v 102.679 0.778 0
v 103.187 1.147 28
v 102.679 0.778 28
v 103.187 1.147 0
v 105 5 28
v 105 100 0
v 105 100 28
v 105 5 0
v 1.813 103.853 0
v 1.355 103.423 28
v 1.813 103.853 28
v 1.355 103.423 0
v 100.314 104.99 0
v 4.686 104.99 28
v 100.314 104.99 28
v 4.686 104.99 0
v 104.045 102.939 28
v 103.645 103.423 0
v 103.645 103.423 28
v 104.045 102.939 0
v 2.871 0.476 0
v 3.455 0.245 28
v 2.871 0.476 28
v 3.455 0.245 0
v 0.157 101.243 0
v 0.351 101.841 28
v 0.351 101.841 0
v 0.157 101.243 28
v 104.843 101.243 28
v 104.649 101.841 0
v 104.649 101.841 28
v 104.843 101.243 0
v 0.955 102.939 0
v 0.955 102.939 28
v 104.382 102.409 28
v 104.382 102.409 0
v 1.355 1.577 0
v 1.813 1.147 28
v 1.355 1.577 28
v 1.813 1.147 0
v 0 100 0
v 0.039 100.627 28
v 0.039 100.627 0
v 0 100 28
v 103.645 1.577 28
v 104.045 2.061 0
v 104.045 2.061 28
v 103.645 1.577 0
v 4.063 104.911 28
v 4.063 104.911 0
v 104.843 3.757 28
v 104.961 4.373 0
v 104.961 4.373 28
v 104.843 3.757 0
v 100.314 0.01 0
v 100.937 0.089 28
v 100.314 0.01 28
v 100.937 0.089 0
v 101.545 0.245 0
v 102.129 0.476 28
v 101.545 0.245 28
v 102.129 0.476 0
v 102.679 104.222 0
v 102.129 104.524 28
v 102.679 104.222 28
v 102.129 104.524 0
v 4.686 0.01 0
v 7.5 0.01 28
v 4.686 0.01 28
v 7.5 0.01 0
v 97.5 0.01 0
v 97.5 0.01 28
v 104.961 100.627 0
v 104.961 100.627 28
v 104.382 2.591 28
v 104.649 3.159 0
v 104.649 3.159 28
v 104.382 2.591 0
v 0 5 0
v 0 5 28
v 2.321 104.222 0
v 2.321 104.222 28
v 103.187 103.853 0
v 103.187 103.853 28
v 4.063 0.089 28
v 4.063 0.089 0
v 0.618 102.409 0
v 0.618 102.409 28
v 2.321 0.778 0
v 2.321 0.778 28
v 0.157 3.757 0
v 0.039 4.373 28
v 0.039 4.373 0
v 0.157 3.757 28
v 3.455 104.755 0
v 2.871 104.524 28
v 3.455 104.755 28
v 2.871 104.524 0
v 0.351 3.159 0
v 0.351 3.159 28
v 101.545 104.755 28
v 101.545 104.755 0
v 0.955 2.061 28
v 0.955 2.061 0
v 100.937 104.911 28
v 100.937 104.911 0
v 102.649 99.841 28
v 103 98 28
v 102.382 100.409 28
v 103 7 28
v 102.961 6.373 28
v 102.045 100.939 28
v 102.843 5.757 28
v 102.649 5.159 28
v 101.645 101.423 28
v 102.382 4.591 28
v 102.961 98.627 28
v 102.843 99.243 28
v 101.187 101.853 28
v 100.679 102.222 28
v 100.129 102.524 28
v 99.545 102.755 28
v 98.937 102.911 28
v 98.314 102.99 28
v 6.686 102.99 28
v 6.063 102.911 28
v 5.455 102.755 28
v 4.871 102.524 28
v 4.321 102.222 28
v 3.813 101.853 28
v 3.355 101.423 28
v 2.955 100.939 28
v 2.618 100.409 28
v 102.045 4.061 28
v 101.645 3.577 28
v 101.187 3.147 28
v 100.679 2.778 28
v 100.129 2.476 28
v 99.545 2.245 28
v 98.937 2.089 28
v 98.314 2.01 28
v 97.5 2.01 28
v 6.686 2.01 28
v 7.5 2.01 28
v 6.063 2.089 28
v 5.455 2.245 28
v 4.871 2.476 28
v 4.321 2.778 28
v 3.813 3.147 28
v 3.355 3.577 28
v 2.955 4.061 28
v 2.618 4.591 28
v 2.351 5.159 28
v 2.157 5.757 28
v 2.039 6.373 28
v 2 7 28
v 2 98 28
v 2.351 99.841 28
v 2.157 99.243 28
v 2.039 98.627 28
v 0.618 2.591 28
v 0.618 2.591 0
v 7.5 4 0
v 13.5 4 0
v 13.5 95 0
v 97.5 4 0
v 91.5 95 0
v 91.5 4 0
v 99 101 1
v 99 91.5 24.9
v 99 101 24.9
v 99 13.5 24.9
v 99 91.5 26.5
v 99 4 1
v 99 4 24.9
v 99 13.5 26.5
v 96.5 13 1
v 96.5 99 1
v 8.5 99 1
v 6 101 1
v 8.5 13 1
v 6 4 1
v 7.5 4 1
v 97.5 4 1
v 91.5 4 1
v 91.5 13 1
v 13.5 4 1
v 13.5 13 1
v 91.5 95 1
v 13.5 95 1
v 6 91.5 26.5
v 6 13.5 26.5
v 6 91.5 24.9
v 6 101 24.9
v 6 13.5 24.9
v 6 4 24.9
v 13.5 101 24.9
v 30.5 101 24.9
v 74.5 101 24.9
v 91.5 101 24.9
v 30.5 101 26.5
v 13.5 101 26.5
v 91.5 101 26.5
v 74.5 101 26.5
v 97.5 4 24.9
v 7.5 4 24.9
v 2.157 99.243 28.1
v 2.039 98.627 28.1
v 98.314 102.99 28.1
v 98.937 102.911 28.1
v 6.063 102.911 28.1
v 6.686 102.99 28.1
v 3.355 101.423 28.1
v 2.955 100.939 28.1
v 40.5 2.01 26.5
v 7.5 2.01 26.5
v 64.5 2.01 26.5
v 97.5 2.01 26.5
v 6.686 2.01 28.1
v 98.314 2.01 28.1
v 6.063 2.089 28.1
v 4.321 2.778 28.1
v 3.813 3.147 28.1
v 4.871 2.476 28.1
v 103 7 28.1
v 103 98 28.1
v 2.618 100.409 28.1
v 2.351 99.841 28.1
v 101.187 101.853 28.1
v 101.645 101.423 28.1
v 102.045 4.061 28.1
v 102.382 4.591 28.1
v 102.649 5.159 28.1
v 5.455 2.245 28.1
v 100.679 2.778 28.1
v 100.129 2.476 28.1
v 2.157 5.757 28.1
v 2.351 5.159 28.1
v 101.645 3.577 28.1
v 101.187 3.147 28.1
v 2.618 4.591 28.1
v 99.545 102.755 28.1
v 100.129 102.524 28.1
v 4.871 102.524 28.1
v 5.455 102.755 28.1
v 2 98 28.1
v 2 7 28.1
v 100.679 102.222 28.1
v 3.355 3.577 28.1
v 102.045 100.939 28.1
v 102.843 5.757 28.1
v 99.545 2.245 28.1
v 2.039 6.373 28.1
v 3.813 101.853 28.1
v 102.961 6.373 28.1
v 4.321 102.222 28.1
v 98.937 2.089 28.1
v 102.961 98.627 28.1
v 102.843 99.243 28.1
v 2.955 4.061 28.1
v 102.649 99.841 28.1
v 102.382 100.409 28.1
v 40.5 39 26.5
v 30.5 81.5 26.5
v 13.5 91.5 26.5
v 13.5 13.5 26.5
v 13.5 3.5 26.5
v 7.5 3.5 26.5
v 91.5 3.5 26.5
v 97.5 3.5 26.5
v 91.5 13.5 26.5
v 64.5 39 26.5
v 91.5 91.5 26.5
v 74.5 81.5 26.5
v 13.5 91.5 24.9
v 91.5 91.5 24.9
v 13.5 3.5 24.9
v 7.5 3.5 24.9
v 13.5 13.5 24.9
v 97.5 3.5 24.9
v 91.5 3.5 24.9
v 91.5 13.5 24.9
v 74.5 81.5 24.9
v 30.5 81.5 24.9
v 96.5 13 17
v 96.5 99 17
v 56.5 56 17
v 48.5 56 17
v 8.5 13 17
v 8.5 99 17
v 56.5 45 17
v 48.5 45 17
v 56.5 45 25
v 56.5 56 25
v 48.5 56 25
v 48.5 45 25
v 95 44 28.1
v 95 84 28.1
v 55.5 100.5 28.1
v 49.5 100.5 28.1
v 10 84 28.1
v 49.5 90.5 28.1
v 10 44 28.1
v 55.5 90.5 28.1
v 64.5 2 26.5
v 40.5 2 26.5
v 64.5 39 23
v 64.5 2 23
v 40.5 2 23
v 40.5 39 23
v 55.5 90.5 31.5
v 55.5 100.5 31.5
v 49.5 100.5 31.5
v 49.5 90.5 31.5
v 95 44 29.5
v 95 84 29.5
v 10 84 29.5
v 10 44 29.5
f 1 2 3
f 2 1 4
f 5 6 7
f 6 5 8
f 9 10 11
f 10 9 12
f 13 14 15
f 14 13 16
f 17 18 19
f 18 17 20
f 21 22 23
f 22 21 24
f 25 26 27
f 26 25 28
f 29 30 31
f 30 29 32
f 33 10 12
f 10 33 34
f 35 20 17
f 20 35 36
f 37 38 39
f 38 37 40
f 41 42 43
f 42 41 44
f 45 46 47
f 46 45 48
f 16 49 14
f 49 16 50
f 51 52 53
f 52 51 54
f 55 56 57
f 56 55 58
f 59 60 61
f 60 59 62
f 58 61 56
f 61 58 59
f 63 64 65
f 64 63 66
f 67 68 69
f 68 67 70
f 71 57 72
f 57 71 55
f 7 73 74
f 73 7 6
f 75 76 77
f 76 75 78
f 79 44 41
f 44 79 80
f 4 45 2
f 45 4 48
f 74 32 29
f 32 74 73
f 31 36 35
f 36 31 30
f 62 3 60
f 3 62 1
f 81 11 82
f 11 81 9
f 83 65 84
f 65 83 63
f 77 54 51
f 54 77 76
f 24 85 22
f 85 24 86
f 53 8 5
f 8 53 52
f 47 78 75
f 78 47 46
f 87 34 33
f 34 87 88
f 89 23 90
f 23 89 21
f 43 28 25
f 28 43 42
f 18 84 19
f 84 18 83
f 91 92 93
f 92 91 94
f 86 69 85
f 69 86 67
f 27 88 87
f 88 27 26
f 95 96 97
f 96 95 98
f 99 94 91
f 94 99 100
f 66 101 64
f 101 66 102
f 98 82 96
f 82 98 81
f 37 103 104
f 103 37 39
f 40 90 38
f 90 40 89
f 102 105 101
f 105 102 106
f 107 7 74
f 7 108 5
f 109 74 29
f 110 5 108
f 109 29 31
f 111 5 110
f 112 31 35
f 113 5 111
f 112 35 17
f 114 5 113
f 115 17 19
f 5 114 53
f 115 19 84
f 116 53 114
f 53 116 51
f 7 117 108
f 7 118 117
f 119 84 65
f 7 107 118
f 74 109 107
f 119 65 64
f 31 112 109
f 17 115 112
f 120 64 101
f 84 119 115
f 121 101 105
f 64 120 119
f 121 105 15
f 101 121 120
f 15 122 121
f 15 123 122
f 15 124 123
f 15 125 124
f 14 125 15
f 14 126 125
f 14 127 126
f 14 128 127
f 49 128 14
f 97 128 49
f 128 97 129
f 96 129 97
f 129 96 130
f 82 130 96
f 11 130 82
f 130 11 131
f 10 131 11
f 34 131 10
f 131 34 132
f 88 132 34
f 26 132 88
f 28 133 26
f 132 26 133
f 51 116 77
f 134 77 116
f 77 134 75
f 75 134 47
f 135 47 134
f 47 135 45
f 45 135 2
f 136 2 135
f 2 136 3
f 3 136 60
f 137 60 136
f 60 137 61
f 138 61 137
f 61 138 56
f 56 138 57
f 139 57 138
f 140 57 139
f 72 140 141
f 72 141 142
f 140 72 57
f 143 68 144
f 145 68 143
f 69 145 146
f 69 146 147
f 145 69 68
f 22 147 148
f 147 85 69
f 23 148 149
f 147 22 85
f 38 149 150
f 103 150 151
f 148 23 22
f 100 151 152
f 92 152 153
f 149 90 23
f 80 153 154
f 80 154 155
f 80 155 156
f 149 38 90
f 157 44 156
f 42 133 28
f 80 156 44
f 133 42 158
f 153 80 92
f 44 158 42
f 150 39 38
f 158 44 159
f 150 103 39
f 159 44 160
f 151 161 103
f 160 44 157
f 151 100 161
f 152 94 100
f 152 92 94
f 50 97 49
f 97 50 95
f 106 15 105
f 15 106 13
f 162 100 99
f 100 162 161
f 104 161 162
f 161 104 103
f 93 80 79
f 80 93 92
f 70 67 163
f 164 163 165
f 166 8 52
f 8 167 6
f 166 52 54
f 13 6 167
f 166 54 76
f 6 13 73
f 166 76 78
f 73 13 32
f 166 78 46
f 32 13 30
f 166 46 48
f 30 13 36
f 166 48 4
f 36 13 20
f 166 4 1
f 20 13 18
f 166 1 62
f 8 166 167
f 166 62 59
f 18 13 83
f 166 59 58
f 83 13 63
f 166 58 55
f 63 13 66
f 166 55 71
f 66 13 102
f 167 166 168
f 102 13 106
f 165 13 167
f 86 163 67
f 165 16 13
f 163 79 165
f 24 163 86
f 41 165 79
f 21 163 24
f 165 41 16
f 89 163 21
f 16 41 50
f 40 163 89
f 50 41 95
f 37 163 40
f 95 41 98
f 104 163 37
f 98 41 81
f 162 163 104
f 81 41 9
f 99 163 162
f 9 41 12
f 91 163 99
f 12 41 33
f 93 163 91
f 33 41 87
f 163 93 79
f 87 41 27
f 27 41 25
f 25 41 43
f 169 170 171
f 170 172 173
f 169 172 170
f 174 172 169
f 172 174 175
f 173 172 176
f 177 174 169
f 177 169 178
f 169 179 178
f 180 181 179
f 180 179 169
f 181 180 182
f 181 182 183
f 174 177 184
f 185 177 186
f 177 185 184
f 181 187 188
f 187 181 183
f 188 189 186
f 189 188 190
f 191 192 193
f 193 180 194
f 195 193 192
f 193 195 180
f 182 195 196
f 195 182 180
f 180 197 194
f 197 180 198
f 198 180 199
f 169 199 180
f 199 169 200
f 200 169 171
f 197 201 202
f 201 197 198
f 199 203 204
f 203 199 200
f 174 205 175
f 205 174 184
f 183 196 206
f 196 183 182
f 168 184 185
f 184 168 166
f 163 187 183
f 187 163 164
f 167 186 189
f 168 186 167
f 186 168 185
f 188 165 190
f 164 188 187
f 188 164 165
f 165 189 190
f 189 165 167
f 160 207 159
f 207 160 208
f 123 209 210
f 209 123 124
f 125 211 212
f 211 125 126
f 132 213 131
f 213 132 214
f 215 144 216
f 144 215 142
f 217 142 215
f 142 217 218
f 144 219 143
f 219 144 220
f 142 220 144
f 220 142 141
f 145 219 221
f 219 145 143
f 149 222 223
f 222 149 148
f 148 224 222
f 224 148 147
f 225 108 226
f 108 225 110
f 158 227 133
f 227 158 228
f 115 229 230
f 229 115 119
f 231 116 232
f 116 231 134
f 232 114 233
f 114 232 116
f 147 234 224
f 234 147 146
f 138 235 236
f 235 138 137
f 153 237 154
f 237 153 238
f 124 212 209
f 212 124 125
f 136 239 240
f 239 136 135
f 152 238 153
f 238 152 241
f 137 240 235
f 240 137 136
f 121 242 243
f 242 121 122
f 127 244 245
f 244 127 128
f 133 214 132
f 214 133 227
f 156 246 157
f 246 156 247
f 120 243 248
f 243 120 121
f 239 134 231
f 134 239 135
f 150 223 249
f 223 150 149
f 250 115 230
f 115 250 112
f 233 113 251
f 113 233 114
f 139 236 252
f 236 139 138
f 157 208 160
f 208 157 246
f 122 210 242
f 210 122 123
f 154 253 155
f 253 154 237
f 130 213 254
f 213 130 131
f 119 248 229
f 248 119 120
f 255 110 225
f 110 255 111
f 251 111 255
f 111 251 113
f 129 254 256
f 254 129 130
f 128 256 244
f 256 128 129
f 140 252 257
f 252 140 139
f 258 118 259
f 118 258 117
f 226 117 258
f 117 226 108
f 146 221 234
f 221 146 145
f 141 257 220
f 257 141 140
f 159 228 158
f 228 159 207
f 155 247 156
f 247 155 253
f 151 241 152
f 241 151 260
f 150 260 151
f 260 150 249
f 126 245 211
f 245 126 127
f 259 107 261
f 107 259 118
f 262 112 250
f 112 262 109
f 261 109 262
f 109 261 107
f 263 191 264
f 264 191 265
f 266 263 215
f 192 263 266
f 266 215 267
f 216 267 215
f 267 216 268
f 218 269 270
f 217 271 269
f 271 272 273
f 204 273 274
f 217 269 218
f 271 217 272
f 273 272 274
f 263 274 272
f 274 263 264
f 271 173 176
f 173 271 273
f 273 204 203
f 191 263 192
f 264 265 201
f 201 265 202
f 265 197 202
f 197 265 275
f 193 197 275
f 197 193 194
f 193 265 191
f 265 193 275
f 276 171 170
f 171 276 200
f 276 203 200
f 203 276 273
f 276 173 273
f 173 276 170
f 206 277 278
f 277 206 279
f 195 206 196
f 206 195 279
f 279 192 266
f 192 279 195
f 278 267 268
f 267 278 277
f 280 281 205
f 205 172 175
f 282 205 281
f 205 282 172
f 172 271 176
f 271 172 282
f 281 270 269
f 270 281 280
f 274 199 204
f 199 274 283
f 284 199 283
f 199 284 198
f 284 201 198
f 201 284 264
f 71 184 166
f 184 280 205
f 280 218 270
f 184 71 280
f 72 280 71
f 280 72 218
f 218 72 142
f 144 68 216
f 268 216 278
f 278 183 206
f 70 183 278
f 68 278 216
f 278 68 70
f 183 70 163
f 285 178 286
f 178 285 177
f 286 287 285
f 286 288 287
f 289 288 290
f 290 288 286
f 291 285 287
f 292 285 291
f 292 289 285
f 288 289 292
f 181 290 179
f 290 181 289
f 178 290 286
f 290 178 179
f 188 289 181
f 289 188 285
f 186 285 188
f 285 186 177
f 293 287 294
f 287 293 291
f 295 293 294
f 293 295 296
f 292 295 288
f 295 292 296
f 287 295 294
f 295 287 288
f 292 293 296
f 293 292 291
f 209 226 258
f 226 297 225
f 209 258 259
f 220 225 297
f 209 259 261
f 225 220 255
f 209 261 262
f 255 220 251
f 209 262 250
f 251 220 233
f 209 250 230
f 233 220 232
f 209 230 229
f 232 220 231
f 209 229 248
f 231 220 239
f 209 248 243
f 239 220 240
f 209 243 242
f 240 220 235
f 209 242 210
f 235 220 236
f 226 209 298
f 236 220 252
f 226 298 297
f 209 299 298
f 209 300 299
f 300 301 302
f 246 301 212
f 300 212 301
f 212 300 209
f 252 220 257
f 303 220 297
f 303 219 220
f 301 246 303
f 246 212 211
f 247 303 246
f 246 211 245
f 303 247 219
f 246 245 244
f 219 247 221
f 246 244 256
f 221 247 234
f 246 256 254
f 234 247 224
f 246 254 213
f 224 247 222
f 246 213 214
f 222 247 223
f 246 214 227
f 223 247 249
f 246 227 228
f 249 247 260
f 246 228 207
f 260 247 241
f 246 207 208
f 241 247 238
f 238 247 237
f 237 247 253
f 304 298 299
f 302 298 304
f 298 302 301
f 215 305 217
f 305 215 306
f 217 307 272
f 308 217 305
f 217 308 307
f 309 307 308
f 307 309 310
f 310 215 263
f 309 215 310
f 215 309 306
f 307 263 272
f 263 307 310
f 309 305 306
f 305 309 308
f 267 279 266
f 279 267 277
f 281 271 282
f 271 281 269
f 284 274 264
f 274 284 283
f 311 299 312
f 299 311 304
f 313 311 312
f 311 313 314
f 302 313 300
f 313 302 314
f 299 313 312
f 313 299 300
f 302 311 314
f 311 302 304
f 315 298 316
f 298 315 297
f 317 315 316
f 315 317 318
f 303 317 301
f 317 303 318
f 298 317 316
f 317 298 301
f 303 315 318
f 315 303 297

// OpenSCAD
// Define the switch type to be covered.
// New style Single switch = 0
// New style Double switch = 1 - not implemented.
// Old style Single switch = 2
// Old style Double switch = 3
switchType  = 2; // Update depth also.

// if new style switch
//depth = 19;
// if old style
depth = 28;

// The gap to leave between the cover and the base when pushed together.
// Adjust this to give a tighter (smaller number) or looser (larger number) fit between
// the base and the cover. This will depend on your printer.
coverToBasegap = 0.4;
            
// Size of the outer bezel that surounds the PCB
bezelSize = 2;

// Thickness of the cover wall.
// PCB overlap onto support = 2
// then add the bezel size to allow for an overall wall thickness.
wallThickness = 2 + bezelSize;
sideWallThickness = 4 + bezelSize;

// PCB size we are trying to fit.
pcbHeight = 101;// 
pcbWidth = 101;// 100 + 1mm bodge
// How thick (deep) the front panel is (1.6mm FR4 PCB)
pcbThickness = 1.6;

// Overall size
height = pcbHeight + (2*bezelSize);
width = pcbWidth + (2*bezelSize);

// Switch size (physical size of the light switch being covered)
switchHeight = pcbHeight-15; //88;
switchWidth = 88;
switchDepth = 22;
// How much the switch body should overlap onto the base
switchOverlap = 5;

middleDepth = 10;

// How deep the inside of the box is.
baseInnerThickness = 1;

// Make the case in 2 parts. Initial cut off for the lower "half" of the case.
lowerCaseCutOffAt = 20 + bezelSize; 

// -----------------------------------------
// -----------------------------------------
module GenericBase(xDistance, yDistance, zHeight) {
	// roundedBox([xDistance, yDistance, zHeight], 2, true);

	// Create a rectangluar base to work from that
	// is xDistance by yDistance and zHeight height.

	// This is effectivly a cube with rounded corners

	// extend the base out by 3.5 from holes by using minkowski
	// which gives rounded corners to the board in the process
	// matching the Gadgeteer design
	
	$fn=50;
	radius = 5; //bezelSize;


	translate([radius,radius,0]) {
		minkowski()
		{
			// 3D Minkowski sum all dimensions will be the sum of the two object's dimensions
			cube([xDistance-(radius*2), yDistance-(radius*2), zHeight /2]);
			cylinder(r=radius,h=zHeight/2);
		}
	}
}



// -----------------------------------------
// Base for the switch, goes around existing lightswitch.
// -----------------------------------------
module LightSwitchBase() {
	
	difference() {
		union() 
		{
			// Outer base wall
			OuterWall();
		}		
		union() 
		{
			SwitchCutout();
			PcbCutout();
            CutOff();
		}
	}
}

// -----------------------------------------
// Main base outer wall
// -----------------------------------------
module OuterWall() {

    innerCutoutOffset = wallThickness; // bezelSize + x

	difference() {
		union() {
			GenericBase(width, height, depth);
		}
		union() {
			// Cut out the bulk of the inside of the box.
			translate([sideWallThickness, wallThickness, baseInnerThickness]) {
                
                // Rounded interial
				//GenericBase(width - (wallThickness* 2), 
				//					height - (innerCutoutOffset *2), 
				//					(depth - baseInnerThickness) + 1);
                
                // Square interia
                cube([width - (sideWallThickness * 2), 
                    height - (wallThickness *2), 
					(depth - baseInnerThickness) + 1]);
			}
		}
	}
}

// -----------------------------------------
// Cut out an area in the base for the switch allowing
// for an overlap to go under the switch which holds the case to the wall.
// -----------------------------------------
module SwitchCutout() {

	// Cutout smaller than the actual switch to allow for the overlap all around
	cutoutWidth = switchWidth - (switchOverlap*2);
	cutoutHeight = switchHeight - (switchOverlap*2);	

	// Padding either side of the cutout.
	paddingWidth = (width - cutoutWidth) / 2;
	paddingHeight = -10; // Fixed padding from top.

	// Switch cutout.
	// Cut out a area less wide than the switch so it sits on it 
	// keeping the box against the wall
	// -1 z to ensure it goes all the way through
	translate([paddingWidth, paddingHeight, -1]) {
		cube([cutoutWidth, height, 4]);
	}

	// Switch body
	// Create a block to show how the switch body sits
	// in the base.
	switchOuterPaddingWidth = (width - switchWidth) /2;
	switchOuterPaddingHeight = paddingHeight - switchOverlap;

	translate([switchOuterPaddingWidth , switchOuterPaddingHeight,1]) {
		color( [1, 0, 0, 0.90] ) {
            cube([switchWidth, switchHeight, switchDepth]);
		}
	}
}

// -----------------------------------------
// Cut out an area in the base for the PCB.
// -----------------------------------------
module PcbCutout() {
	// Move to a slight offset to allow for an outer bezel.
	// and position so the top of the pcb is at the top of the base box.
	translate([bezelSize, bezelSize, depth - (pcbThickness - 0.1)]) {
		Pcb();        
	}
}

// -----------------------------------------
// Generate a model of the PCB.
// -----------------------------------------
module Pcb() {
    photonWidth = 24;
    photonHeight = 37;
    photonDepth = 3.5;
    
    // PCB.
	GenericBase(pcbWidth, pcbHeight, pcbThickness);
    
    // Photon
    translate([(pcbWidth/2) - (photonWidth /2),0 , -(photonDepth)]) {
        cube([photonWidth, photonHeight, photonDepth]);
    }
    
    // LEDs
    ledOffsetFromEdge = 1.5;
    ledWidth = 10; // Include the resistor and LED and a small fudge for the oversized PCB.
    ledHeight = 10;
    ledDepth = 0.5;
    
    // Top left LED
    // 0,0,0 bottom left.
    translate([0 + ledOffsetFromEdge,pcbHeight - ledOffsetFromEdge - ledHeight,-pcbThickness]) {
        cube ([ledWidth, ledHeight, ledDepth + pcbThickness]);
    }
    
    // top right LED
    translate([pcbWidth - ledOffsetFromEdge - ledWidth,pcbHeight - ledOffsetFromEdge - ledHeight,-pcbThickness]) {
        cube ([ledWidth, ledHeight, ledDepth + pcbThickness]);
    }
    
    // Bottom Left LED.
    translate([0 + ledOffsetFromEdge,ledOffsetFromEdge,-pcbThickness]) {
        cube ([ledWidth, ledHeight, ledDepth + pcbThickness]);
    }
    
    // Bottom Right LED.
    translate([pcbWidth - ledOffsetFromEdge - ledWidth,ledOffsetFromEdge,-pcbThickness]) {
        cube ([ledWidth, ledHeight, ledDepth + pcbThickness]);
    }
    
    // components for sensors on the base of the board.
    translate([(pcbWidth/2) -22 ,pcbHeight - ledOffsetFromEdge -20, -pcbThickness]) {
        cube([44, 20, ledDepth + pcbThickness]);
    }
    
    // Humidity and gesture components on the board top.
    // 2.5mm offset from board top.
    // 10mm heihg
    // 6mm wide
    // actually 2mm hight but project 5mm to make it stand out.
    translate([(pcbWidth/2) -3 ,pcbHeight - 10 - 2.5, 0]) {
        cube([6, 10, 5]);
    }
    
    // Small raised area to indicade the touch pad.
    // touch pad is 19mm from top.
    // 40mm height
    // 85mm wide
    // 8mm from left/right edge.
    translate([8,pcbHeight -40- 19, 0]) {
        cube([85, 40, 3]);
    }
    
    // V1.1 of PCB no longer has screw holes.
    includeScrewHoles = false;
    // Screw holes
    if (includeScrewHoles) {
        // All the way through to prevent trapped resin on Form printer.
        translate([(pcbWidth/2) - 48 ,(pcbHeight/2), -(depth+1)]) {
            cylinder(r=1.25, h=depth + 3, $fn=40);
        }
    
        translate([(pcbWidth/2) + 48,(pcbHeight/2), -(depth+1)]) {
            cylinder(r=1.25, h=depth + 3, $fn=40);
        }
    }
}

// -----------------------------------------
// Cutoff the end of the switch to allow it to be pushed over the lightswitch 
// and slid down. The outer cover will hide this missing piece.
// -----------------------------------------
module CutOff() { 
    cutOffCubeHeight = height - lowerCaseCutOffAt;
    
    // +2 on switch width to allow for a small tolerance.
    cutoutOffset = (width - (switchWidth+2)) / 2;
    cutoutWidth = width - (wallThickness*2) - (switchOverlap*2) + 2*2;
    
    translate([cutoutOffset,0,0]) {
        cube([switchWidth+2,wallThickness  ,depth+2]);
    }
}

// -----------------------------------------
// This is the outer cover that goes over the base and
// holds the PCB in place.
// -----------------------------------------
module Cover() {
    coverWallThickness = 2;
    
    coverWidth = width + coverWallThickness*2;
    coverHeight = height + coverWallThickness*2;
        
    // Cover depth to match the overall depth of the base
    // plus the additional cover top thickness
    // then allow 1mm gap for wall edge variances so it's a snug-ish fit
    // ensuring cover goes fully onto base.
    coverWallOffset = 1;
    coverDepth = depth + coverWallThickness - coverWallOffset;
    coverTopThickness = 1;
    
    sensorSetHeight = 12;
    sensorSetWidth = 8;
    // How far down from the top of the cover the opening for the sensor set should be.
    sensorSetTopOffset = 4.5;
    
    usbHeight = 10; // Height here is in the z axid.
    usbWidth = 13;
    
    // How much over the top (sensors) the cover should cover.
    coverTopOverlap = 21;
    // How much over the bottom the cover should cover.
    // this hides the non-touchable zone (where the Photon would mess
    // with tuch sensor.
    coverBottomOverlap = 43;
    
    difference() {
		union() {
			GenericBase(coverWidth, coverHeight, coverDepth);
		}
		union() {
			// Hollow out the main base area.
			//translate([innerCutoutOffset, innerCutoutOffset, baseInnerThickness]) {
            translate([coverWallThickness - coverToBasegap, 
                        coverWallThickness - coverToBasegap, 
                        -coverTopThickness]) {
				GenericBase(width + (coverToBasegap*2), height + (coverToBasegap*2), coverDepth);
			}
            
            // Gives an overlap of 10mm on the PCB left and right
            // and a larger overlap at the top to cover the sensor area.
            // and matching overlap at the bottom to give it some sym.
            translate([10,coverTopOverlap,+2]) {
				GenericBase(coverWidth-20, coverHeight- (coverTopOverlap + coverBottomOverlap ), coverDepth);
			}
            
            // Cout out the space for the sensors.
            // move down coverWallThickness + 2mm from top so some PCB is covered.
            translate([(coverWidth/2)-(sensorSetWidth/2),
                        coverWallThickness + sensorSetTopOffset,
                        depth-coverTopThickness + coverWallOffset]) {
                #cube([sensorSetWidth,sensorSetHeight,coverTopThickness]);
            }
            
            // Cutout for the USB connector...
            translate([(coverWidth/2)-(usbWidth/2),
                        coverHeight - coverWallThickness - 1,
                        depth-(coverTopThickness + usbHeight) + coverWallOffset]) {
                cube([usbWidth,coverWallThickness+2,usbHeight]);
                // TODO: Put cylinders on ends to make it rounded.
            }
		}
	}
}

// -----------------------------------------
// Show the model of the switch.
// NB: Do not include when generating stl's
// -----------------------------------------
module Switch(xOffset, yOffset, zOffset) {
    translate([xOffset, yOffset, zOffset]) {
        color( [0, 0, 1, 1] ) {
                       
            if(switchType == 0) {            
                // New style switches
                
                // Square switch base
                cube([switchWidth, switchHeight, 10]);
                
                // Put the actual switch switch on the base.
                translate([(switchWidth /2) - 8, (switchHeight/2) - 13, 10]) {
                    cube([16, 26, 6]);
                }
            } else if(switchType == 2) {
                // Old style lever switch
                
                // Square switch base
                cube([switchWidth, switchHeight, 16]);
                
                // Put the actual switch switch on the base
                // Show switch on the on position only as it would be expected tobe.
                // Make switch y=22mm for full range.
                translate([(switchWidth /2) - 4, (switchHeight/2)-11, 16]) {
                    cube([8, 11, 8]);
                }
            } else if(switchType == 3) {
                // Old style lever switch
                
                // Square switch base
                cube([switchWidth, switchHeight, 16]);
                
                // Put the actual switch switch on the base
                // Show switch for On & Off as either switch
                // may be in that state as this is typically
                // a landing/hall switch and has a second switch
                translate([(switchWidth /2) - 13, (switchHeight/2)-11, 16]) {
                    cube([26, 22, 8]);
                }
            }
		}
    }
}





// -----------------------------------------
// MAIN
// -----------------------------------------

LightSwitchBase();

// Case top rotated 180° (well openings swapped around.
// so rotate and adjust position os they sit ontop.
rotate(180) {
    
    // Adjust x offset to move cover up/down onto base.
    translate([-width -2.2,-height -2.2,0]) {
        color( [0, 1, 0, 1] ) {
           //Cover();
        }
    }
}


// Optional models to help visualise the enclosure.


// Show the actual light switch we are covering
// comment out when generating STLs.
Switch(8.5,13,1);

    
// Show the PCB (in purple)
// comment out when generating STLs.
translate([bezelSize, bezelSize, depth - (pcbThickness - 0.1)]) {
    color( "purple" ) {
        Pcb();        
	}
}
